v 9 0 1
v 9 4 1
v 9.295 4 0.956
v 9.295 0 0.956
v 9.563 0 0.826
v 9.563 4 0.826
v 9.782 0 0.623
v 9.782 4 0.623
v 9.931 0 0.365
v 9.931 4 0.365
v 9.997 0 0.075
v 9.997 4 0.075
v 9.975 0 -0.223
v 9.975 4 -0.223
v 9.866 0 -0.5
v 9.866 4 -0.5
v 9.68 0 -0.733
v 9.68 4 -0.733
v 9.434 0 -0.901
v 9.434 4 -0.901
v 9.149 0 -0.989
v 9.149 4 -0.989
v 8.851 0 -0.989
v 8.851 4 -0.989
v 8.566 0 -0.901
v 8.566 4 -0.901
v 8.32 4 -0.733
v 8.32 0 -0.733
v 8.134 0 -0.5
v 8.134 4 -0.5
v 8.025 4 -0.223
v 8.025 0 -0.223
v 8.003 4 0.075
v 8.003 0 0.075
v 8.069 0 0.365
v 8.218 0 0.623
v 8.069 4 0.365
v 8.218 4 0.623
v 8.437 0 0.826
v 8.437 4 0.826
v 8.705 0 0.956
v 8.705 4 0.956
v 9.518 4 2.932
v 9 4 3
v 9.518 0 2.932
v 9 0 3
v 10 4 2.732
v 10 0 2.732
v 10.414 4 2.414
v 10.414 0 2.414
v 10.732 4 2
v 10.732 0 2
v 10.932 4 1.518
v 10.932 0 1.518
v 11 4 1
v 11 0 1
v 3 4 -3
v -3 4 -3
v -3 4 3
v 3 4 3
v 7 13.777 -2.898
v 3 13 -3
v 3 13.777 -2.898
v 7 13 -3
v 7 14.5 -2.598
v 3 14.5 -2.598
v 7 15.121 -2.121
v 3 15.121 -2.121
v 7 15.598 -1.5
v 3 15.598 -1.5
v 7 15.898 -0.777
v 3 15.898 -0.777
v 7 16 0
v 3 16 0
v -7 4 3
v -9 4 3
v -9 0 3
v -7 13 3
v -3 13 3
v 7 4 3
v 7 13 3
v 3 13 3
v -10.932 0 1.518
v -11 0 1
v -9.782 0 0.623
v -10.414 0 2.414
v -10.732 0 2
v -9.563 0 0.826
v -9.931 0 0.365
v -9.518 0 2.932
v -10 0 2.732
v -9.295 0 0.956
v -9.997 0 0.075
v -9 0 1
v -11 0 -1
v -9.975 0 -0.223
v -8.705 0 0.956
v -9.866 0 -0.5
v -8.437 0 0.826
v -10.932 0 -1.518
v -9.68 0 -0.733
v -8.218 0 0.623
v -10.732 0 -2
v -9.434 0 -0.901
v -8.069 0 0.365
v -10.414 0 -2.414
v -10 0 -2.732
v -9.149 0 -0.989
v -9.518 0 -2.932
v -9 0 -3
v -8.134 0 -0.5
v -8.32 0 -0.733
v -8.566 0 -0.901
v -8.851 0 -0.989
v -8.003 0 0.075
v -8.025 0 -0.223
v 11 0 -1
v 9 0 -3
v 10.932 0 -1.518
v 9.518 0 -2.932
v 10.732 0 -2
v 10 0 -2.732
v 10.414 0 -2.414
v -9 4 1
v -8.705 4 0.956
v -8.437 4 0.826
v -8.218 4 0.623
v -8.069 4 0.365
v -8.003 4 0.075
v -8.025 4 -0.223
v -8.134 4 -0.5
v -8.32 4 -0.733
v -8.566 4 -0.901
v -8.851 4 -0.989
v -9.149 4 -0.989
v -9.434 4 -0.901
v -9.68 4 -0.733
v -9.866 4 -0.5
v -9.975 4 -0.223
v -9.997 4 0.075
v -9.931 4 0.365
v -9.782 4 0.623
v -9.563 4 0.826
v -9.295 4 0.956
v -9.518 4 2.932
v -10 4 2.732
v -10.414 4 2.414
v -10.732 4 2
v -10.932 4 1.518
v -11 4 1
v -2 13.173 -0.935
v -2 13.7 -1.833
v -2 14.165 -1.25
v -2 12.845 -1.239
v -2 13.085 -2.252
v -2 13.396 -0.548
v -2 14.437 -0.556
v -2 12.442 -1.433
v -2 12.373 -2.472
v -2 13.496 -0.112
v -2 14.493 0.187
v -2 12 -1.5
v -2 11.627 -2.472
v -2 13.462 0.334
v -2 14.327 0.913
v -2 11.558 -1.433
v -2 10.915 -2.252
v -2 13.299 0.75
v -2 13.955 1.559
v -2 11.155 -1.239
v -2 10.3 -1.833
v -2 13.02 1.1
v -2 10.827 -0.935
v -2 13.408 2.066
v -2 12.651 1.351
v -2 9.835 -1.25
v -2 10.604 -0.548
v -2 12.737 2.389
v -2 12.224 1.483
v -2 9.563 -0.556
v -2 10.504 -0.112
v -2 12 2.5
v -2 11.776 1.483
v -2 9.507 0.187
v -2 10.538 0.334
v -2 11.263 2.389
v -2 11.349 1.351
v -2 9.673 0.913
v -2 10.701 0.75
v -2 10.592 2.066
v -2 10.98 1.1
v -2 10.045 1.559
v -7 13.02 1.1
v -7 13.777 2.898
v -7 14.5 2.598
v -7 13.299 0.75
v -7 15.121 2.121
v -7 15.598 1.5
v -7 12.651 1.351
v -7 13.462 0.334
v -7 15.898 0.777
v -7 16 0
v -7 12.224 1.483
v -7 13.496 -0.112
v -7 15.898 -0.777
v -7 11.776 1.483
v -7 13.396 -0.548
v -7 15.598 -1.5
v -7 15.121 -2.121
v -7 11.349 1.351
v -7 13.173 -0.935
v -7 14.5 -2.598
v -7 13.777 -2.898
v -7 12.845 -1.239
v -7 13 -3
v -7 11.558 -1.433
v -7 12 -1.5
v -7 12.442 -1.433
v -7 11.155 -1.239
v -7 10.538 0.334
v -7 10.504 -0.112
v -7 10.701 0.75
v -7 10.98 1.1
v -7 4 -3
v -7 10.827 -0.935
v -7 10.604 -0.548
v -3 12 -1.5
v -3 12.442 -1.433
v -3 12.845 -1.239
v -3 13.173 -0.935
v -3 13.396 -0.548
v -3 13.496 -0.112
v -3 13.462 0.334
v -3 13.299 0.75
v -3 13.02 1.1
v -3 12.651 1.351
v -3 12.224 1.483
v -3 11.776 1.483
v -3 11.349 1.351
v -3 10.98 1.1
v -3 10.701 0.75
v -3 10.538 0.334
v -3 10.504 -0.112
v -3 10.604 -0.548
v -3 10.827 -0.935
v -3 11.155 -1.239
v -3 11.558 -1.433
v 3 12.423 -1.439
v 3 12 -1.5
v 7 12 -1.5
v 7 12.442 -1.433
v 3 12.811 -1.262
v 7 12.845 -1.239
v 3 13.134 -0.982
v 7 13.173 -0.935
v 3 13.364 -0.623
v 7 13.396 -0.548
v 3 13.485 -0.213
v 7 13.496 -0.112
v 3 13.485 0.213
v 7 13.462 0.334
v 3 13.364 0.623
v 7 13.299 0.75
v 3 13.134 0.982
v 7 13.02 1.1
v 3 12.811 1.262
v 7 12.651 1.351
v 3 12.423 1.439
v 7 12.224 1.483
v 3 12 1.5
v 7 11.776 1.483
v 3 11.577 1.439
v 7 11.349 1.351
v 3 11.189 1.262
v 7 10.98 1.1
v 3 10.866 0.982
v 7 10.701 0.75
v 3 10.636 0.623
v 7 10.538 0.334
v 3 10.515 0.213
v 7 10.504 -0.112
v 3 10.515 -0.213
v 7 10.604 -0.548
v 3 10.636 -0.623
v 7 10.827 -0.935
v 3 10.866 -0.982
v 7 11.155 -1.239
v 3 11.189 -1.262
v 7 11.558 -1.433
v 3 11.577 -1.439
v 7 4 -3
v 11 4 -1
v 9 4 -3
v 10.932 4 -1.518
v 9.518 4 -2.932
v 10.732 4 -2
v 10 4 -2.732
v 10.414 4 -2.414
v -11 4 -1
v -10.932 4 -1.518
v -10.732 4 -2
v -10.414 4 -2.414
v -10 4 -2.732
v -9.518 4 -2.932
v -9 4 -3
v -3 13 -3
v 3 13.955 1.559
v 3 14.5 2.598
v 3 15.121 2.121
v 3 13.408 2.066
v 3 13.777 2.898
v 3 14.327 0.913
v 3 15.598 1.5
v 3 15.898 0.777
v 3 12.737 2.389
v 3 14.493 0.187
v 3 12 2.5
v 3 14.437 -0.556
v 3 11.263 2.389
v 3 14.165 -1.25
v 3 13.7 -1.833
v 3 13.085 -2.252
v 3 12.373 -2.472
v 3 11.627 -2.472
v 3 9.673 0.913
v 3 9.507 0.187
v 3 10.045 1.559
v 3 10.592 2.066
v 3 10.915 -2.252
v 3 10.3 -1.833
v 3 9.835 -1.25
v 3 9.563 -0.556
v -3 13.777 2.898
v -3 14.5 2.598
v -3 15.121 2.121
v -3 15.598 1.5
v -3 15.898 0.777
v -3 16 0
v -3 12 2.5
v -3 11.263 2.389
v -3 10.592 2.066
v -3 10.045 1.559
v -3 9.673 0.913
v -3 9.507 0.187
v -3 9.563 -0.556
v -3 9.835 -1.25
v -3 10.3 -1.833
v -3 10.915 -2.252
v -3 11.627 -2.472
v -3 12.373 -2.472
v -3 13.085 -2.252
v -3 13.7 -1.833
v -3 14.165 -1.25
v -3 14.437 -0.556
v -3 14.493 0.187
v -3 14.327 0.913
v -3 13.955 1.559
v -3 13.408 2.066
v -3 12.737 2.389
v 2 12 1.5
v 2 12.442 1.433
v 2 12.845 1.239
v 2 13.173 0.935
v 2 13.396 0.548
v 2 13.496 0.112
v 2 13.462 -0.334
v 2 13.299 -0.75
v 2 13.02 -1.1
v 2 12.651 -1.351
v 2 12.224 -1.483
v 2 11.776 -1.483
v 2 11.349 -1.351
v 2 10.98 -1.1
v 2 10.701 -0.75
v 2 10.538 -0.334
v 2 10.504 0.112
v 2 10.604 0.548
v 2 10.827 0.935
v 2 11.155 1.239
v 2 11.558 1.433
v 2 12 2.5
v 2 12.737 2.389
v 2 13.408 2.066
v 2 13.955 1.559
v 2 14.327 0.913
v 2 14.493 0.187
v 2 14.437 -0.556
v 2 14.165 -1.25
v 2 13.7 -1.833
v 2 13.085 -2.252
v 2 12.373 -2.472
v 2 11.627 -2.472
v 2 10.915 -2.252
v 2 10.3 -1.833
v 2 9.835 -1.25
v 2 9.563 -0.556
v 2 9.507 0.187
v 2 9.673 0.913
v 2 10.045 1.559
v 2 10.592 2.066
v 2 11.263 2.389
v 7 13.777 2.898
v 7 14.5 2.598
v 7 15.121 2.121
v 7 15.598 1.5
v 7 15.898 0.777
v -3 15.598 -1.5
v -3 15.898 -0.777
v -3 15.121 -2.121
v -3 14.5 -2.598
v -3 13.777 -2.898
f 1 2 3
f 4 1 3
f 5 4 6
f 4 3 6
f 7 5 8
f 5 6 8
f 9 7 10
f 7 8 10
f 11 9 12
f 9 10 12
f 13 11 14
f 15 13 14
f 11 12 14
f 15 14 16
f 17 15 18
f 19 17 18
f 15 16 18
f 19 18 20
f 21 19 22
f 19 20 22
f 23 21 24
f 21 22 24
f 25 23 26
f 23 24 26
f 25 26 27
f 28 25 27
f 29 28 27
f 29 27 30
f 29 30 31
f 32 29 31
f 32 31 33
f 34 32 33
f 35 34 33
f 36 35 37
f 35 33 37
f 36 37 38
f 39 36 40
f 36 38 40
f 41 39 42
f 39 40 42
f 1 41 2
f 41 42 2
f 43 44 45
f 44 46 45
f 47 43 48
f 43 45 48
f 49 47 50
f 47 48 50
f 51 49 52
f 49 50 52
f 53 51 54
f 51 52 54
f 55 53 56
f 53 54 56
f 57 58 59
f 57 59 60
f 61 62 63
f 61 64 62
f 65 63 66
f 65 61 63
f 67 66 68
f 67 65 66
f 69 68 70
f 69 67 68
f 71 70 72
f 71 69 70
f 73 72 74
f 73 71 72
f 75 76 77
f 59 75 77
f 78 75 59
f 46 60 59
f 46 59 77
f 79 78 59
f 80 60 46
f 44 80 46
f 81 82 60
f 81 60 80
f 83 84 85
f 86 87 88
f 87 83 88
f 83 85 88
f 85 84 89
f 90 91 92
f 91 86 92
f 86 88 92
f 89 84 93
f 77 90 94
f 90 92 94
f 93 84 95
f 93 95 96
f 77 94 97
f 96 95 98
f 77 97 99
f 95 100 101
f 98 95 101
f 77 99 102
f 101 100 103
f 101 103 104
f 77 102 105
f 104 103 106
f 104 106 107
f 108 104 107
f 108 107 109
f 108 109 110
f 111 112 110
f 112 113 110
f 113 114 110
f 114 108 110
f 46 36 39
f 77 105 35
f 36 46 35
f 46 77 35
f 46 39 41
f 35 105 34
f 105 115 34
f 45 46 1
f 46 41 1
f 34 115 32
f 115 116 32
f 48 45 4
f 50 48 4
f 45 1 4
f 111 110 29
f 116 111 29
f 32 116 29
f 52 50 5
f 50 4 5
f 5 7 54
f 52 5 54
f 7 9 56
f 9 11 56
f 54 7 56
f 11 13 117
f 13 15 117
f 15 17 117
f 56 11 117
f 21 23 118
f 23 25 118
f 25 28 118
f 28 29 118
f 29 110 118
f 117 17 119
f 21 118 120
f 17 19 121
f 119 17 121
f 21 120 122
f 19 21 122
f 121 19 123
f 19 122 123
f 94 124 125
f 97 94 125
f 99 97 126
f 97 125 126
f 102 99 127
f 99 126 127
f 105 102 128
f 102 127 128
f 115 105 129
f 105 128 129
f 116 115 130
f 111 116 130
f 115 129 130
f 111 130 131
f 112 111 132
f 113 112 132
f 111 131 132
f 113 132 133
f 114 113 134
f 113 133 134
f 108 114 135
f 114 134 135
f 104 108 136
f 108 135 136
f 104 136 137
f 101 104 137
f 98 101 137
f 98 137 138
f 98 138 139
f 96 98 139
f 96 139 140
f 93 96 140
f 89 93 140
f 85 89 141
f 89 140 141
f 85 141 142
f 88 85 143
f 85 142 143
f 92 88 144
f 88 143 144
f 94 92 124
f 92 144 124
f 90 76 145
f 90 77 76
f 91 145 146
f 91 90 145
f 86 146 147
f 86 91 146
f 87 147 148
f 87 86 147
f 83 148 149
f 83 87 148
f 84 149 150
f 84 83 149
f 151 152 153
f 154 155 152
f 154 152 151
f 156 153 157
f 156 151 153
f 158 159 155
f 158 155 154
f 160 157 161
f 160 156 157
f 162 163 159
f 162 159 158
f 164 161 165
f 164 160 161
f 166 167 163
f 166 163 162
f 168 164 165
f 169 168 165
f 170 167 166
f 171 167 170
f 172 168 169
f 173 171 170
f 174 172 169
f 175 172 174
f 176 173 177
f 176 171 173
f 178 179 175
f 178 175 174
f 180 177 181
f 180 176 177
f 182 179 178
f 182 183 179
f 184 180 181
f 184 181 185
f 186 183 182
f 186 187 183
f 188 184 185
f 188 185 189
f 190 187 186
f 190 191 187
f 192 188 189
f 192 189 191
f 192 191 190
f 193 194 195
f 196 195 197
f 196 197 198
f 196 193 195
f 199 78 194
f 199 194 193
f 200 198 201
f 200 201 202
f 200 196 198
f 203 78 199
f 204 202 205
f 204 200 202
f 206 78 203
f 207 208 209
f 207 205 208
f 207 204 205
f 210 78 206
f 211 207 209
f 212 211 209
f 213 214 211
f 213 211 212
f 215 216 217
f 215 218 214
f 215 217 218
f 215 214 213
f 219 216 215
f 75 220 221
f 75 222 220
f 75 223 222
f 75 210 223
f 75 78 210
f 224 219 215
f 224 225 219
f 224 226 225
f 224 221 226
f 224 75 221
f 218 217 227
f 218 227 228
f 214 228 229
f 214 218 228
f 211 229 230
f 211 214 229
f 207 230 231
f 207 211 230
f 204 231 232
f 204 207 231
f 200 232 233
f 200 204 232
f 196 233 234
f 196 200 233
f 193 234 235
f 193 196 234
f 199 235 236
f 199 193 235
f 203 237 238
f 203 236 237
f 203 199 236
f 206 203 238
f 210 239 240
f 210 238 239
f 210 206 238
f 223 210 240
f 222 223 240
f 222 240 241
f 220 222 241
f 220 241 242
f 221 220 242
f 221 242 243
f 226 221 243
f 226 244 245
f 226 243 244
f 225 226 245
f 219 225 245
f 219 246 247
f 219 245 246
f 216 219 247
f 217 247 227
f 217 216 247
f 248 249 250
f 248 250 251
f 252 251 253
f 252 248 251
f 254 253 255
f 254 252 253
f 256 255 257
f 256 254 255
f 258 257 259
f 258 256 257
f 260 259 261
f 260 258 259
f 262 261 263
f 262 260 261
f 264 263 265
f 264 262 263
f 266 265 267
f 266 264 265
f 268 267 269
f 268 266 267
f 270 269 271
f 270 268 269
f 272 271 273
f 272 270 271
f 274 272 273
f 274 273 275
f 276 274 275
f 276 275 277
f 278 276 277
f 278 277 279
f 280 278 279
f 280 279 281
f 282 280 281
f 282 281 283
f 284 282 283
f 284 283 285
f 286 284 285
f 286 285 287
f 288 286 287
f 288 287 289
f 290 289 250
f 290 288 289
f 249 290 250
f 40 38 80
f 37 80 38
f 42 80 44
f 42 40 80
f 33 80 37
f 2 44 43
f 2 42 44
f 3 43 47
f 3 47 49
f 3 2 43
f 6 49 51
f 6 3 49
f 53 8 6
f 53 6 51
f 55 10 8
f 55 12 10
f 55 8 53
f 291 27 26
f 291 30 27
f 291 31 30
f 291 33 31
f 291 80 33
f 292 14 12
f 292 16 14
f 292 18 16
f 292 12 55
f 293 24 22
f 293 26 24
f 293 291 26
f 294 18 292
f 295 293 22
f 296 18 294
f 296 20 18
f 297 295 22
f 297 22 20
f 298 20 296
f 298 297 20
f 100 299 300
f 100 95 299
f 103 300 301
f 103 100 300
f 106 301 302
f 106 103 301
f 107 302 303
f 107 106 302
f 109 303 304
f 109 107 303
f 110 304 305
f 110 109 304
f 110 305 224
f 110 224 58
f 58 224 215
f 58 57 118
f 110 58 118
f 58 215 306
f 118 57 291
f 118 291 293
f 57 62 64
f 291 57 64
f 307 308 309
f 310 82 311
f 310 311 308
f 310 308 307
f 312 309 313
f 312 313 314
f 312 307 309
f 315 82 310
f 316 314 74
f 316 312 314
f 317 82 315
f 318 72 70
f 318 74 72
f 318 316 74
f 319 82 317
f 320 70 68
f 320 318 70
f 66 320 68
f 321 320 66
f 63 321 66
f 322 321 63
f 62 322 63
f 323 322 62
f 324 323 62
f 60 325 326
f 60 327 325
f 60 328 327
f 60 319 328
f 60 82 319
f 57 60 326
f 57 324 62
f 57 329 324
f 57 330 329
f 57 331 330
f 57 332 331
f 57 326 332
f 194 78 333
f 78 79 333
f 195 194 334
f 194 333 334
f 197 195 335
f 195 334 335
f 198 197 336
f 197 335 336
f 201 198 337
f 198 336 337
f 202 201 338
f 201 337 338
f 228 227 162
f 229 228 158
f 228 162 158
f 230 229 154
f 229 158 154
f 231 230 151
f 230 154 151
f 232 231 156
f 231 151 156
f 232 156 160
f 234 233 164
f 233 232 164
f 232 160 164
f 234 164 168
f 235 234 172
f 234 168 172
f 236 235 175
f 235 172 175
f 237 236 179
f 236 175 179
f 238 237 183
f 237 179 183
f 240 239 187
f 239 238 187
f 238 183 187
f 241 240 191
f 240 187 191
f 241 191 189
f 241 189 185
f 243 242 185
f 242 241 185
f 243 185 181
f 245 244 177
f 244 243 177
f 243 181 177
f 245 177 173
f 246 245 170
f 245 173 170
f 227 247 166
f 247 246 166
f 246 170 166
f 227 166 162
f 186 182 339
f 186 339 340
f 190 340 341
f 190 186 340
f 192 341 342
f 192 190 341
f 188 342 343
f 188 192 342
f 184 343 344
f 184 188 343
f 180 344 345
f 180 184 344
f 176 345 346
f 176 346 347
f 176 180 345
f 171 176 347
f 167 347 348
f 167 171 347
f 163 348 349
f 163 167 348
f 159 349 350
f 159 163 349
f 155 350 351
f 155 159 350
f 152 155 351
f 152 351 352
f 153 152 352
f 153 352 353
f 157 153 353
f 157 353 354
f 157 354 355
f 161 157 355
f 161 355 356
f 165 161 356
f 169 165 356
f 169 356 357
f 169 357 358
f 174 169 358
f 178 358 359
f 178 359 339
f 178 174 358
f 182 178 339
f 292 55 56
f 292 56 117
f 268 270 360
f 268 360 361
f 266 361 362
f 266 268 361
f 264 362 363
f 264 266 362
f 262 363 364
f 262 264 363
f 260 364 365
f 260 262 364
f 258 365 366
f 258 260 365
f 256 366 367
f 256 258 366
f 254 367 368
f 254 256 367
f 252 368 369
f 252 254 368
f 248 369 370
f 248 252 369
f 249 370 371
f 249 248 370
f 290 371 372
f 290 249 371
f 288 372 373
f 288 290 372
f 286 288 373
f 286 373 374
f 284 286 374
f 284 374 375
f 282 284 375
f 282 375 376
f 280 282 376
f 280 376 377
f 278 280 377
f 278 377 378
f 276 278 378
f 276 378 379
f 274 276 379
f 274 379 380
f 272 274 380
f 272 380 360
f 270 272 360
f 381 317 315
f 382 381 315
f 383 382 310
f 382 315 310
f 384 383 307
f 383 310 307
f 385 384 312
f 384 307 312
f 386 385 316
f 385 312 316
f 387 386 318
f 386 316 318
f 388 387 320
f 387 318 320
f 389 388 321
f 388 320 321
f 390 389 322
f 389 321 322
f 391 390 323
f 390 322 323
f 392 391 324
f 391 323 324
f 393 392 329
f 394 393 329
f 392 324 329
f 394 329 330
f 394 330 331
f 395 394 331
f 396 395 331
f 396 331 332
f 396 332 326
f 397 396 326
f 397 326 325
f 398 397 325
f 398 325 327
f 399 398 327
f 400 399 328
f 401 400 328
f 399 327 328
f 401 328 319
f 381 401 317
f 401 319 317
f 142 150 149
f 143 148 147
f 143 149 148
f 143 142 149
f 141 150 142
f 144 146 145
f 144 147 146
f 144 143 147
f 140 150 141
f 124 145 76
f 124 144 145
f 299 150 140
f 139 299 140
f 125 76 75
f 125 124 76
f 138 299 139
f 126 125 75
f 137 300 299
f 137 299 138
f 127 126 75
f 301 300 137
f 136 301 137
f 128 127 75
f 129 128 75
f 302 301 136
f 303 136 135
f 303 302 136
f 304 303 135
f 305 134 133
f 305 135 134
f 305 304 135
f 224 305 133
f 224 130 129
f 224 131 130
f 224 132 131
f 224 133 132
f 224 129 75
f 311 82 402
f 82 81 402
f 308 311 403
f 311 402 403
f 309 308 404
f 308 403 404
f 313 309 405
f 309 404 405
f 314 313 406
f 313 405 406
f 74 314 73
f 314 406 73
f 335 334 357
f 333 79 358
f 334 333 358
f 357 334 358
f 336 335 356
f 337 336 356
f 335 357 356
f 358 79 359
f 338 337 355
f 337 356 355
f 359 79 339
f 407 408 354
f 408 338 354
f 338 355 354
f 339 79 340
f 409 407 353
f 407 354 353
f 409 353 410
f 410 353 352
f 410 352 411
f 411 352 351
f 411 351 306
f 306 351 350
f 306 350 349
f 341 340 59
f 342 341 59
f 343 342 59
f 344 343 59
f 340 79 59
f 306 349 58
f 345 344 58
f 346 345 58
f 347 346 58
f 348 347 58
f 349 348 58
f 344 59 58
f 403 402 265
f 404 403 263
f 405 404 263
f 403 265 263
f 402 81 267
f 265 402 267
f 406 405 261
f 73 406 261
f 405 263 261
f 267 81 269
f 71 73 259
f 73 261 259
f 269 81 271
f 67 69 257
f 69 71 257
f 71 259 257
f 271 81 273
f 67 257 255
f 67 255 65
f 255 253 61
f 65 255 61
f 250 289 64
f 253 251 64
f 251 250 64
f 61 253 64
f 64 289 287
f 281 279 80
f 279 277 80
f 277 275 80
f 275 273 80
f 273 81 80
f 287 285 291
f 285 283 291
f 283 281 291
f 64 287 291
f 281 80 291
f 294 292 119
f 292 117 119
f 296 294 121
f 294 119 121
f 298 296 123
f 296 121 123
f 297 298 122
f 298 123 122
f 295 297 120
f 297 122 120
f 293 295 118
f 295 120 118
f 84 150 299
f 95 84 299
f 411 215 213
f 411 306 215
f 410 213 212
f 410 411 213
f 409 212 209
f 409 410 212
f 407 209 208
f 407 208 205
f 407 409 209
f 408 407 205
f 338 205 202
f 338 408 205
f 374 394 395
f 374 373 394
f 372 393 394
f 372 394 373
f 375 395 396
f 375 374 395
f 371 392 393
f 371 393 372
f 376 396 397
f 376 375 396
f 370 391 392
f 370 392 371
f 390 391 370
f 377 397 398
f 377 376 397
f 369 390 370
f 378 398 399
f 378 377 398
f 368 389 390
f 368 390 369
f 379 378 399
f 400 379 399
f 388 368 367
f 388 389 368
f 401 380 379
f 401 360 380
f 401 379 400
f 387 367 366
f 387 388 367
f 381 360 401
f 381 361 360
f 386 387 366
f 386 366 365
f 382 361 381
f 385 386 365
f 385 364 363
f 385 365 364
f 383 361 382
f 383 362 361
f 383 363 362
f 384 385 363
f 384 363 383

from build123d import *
from build123d.topology import SkipClean

# Parameters (mm, degrees)
SKETCH2_W               = 14
SKETCH2_H               = 6
BOSS_EXTRUDE1_DEPTH     = 4
SKETCH3_W               = 4
SKETCH3_H               = 6
BOSS_EXTRUDE2_DEPTH     = 12
CUT_EXTRUDE1_DEPTH      = 22.470910554
CUT_EXTRUDE1_DEPTH_BACK = 22.470910554
SKETCH4_R               = 1.5
BOSS_EXTRUDE3_START     = 1
SKETCH5_R               = 2.5
SKETCH5_R_2             = 1.5
BOSS_EXTRUDE3_DEPTH     = 1
SKETCH6_R               = 2.5
SKETCH6_R_2             = 1.5
BOSS_EXTRUDE4_DEPTH     = 1
SKETCH7_W               = 4
SKETCH7_H               = 6
SKETCH7_R               = 1
BOSS_EXTRUDE5_DEPTH     = 4
FILLET1_R               = 2
FILLET2_R               = 3


with BuildPart() as part:
    # Sketch2 → Boss-Extrude1 (new body)
    with BuildSketch(Plane(origin=(0, 0, 0), x_dir=(1, 0, 0), z_dir=(0, 1, 0))):
        Rectangle(SKETCH2_W, SKETCH2_H)
    extrude(amount=BOSS_EXTRUDE1_DEPTH)

    # Sketch3 → Boss-Extrude2 (add)
    with BuildSketch(Plane(origin=(0, 4, 0), x_dir=(1, 0, 0), z_dir=(0, 1, 0))):
        with Locations((-5, 0)):
            Rectangle(SKETCH3_W, SKETCH3_H)
        with Locations((5, 0)):
            Rectangle(SKETCH3_W, SKETCH3_H)
    extrude(amount=BOSS_EXTRUDE2_DEPTH)

    # Sketch4 → Cut-Extrude1 (cut, two sides: drawn at the far end of the back side and taken through both)
    with BuildSketch(Plane(origin=(7, 0, 0), x_dir=(0, 0, -1), z_dir=(1, 0, 0)).offset(-CUT_EXTRUDE1_DEPTH_BACK)):
        with Locations((0, 12)):
            Circle(SKETCH4_R)
    extrude(amount=CUT_EXTRUDE1_DEPTH + CUT_EXTRUDE1_DEPTH_BACK, mode=Mode.SUBTRACT)

    # Sketch5 → Boss-Extrude3 (add)
    with BuildSketch(Plane(origin=(-3, 0, 0), x_dir=(0, 0, -1), z_dir=(1, 0, 0)).offset(BOSS_EXTRUDE3_START)):
        with Locations(Location((0, 12, 0), (0, 0, 180))):
            Circle(SKETCH5_R)
        with Locations((0, 12)):
            Circle(SKETCH5_R_2, mode=Mode.SUBTRACT)
    extrude(amount=-BOSS_EXTRUDE3_DEPTH)

    # Sketch6 → Boss-Extrude4 (add)
    with SkipClean():  # the faces are left unmerged after this step: merging them gives an invalid solid
        with BuildSketch(Plane.ZY.offset(-3)):
            with Locations((0, 12)):
                Circle(SKETCH6_R)
            with Locations((0, 12)):
                Circle(SKETCH6_R_2, mode=Mode.SUBTRACT)
        extrude(amount=BOSS_EXTRUDE4_DEPTH)

    # Sketch7 → Boss-Extrude5 (add)
    # profile 1 of 2: a face of its own
    with SkipClean():  # the faces are left unmerged after this step: merging them gives an invalid solid
        with BuildSketch(Plane(origin=(0, 4, 0), x_dir=(1, 0, 0), z_dir=(0, 1, 0))):
            with Locations((9, 0)):
                Rectangle(SKETCH7_W, SKETCH7_H)
            with Locations(Location((9, 0, 0), (0, 0, 270))):
                Circle(SKETCH7_R, mode=Mode.SUBTRACT)
        # profile 2 of 2: a face of its own
        with BuildSketch(Plane(origin=(0, 4, 0), x_dir=(1, 0, 0), z_dir=(0, 1, 0))):
            with Locations((-9, 0)):
                Rectangle(SKETCH7_W, SKETCH7_H)
            with Locations(Location((-9, 0, 0), (0, 0, 270))):
                Circle(SKETCH7_R, mode=Mode.SUBTRACT)
        extrude(amount=-BOSS_EXTRUDE5_DEPTH)

    # Fillet1
    fillet1_edges = [part.edges().sort_by_distance(p)[0] for p in [
        (11, 2, -3),
        (11, 2, 3),
        (-11, 2, 3),
        (-11, 2, -3),
    ]]
    fillet(fillet1_edges, radius=FILLET1_R)

    # Fillet2
    fillet2_edges = [part.edges().sort_by_distance(p)[0] for p in [
        (-5, 16, -3),
        (5, 16, -3),
        (5, 16, 3),
        (-5, 16, 3),
    ]]
    fillet(fillet2_edges, radius=FILLET2_R - 0.0001)  # a hair under: the kernel refuses the full size


solid = part.part
